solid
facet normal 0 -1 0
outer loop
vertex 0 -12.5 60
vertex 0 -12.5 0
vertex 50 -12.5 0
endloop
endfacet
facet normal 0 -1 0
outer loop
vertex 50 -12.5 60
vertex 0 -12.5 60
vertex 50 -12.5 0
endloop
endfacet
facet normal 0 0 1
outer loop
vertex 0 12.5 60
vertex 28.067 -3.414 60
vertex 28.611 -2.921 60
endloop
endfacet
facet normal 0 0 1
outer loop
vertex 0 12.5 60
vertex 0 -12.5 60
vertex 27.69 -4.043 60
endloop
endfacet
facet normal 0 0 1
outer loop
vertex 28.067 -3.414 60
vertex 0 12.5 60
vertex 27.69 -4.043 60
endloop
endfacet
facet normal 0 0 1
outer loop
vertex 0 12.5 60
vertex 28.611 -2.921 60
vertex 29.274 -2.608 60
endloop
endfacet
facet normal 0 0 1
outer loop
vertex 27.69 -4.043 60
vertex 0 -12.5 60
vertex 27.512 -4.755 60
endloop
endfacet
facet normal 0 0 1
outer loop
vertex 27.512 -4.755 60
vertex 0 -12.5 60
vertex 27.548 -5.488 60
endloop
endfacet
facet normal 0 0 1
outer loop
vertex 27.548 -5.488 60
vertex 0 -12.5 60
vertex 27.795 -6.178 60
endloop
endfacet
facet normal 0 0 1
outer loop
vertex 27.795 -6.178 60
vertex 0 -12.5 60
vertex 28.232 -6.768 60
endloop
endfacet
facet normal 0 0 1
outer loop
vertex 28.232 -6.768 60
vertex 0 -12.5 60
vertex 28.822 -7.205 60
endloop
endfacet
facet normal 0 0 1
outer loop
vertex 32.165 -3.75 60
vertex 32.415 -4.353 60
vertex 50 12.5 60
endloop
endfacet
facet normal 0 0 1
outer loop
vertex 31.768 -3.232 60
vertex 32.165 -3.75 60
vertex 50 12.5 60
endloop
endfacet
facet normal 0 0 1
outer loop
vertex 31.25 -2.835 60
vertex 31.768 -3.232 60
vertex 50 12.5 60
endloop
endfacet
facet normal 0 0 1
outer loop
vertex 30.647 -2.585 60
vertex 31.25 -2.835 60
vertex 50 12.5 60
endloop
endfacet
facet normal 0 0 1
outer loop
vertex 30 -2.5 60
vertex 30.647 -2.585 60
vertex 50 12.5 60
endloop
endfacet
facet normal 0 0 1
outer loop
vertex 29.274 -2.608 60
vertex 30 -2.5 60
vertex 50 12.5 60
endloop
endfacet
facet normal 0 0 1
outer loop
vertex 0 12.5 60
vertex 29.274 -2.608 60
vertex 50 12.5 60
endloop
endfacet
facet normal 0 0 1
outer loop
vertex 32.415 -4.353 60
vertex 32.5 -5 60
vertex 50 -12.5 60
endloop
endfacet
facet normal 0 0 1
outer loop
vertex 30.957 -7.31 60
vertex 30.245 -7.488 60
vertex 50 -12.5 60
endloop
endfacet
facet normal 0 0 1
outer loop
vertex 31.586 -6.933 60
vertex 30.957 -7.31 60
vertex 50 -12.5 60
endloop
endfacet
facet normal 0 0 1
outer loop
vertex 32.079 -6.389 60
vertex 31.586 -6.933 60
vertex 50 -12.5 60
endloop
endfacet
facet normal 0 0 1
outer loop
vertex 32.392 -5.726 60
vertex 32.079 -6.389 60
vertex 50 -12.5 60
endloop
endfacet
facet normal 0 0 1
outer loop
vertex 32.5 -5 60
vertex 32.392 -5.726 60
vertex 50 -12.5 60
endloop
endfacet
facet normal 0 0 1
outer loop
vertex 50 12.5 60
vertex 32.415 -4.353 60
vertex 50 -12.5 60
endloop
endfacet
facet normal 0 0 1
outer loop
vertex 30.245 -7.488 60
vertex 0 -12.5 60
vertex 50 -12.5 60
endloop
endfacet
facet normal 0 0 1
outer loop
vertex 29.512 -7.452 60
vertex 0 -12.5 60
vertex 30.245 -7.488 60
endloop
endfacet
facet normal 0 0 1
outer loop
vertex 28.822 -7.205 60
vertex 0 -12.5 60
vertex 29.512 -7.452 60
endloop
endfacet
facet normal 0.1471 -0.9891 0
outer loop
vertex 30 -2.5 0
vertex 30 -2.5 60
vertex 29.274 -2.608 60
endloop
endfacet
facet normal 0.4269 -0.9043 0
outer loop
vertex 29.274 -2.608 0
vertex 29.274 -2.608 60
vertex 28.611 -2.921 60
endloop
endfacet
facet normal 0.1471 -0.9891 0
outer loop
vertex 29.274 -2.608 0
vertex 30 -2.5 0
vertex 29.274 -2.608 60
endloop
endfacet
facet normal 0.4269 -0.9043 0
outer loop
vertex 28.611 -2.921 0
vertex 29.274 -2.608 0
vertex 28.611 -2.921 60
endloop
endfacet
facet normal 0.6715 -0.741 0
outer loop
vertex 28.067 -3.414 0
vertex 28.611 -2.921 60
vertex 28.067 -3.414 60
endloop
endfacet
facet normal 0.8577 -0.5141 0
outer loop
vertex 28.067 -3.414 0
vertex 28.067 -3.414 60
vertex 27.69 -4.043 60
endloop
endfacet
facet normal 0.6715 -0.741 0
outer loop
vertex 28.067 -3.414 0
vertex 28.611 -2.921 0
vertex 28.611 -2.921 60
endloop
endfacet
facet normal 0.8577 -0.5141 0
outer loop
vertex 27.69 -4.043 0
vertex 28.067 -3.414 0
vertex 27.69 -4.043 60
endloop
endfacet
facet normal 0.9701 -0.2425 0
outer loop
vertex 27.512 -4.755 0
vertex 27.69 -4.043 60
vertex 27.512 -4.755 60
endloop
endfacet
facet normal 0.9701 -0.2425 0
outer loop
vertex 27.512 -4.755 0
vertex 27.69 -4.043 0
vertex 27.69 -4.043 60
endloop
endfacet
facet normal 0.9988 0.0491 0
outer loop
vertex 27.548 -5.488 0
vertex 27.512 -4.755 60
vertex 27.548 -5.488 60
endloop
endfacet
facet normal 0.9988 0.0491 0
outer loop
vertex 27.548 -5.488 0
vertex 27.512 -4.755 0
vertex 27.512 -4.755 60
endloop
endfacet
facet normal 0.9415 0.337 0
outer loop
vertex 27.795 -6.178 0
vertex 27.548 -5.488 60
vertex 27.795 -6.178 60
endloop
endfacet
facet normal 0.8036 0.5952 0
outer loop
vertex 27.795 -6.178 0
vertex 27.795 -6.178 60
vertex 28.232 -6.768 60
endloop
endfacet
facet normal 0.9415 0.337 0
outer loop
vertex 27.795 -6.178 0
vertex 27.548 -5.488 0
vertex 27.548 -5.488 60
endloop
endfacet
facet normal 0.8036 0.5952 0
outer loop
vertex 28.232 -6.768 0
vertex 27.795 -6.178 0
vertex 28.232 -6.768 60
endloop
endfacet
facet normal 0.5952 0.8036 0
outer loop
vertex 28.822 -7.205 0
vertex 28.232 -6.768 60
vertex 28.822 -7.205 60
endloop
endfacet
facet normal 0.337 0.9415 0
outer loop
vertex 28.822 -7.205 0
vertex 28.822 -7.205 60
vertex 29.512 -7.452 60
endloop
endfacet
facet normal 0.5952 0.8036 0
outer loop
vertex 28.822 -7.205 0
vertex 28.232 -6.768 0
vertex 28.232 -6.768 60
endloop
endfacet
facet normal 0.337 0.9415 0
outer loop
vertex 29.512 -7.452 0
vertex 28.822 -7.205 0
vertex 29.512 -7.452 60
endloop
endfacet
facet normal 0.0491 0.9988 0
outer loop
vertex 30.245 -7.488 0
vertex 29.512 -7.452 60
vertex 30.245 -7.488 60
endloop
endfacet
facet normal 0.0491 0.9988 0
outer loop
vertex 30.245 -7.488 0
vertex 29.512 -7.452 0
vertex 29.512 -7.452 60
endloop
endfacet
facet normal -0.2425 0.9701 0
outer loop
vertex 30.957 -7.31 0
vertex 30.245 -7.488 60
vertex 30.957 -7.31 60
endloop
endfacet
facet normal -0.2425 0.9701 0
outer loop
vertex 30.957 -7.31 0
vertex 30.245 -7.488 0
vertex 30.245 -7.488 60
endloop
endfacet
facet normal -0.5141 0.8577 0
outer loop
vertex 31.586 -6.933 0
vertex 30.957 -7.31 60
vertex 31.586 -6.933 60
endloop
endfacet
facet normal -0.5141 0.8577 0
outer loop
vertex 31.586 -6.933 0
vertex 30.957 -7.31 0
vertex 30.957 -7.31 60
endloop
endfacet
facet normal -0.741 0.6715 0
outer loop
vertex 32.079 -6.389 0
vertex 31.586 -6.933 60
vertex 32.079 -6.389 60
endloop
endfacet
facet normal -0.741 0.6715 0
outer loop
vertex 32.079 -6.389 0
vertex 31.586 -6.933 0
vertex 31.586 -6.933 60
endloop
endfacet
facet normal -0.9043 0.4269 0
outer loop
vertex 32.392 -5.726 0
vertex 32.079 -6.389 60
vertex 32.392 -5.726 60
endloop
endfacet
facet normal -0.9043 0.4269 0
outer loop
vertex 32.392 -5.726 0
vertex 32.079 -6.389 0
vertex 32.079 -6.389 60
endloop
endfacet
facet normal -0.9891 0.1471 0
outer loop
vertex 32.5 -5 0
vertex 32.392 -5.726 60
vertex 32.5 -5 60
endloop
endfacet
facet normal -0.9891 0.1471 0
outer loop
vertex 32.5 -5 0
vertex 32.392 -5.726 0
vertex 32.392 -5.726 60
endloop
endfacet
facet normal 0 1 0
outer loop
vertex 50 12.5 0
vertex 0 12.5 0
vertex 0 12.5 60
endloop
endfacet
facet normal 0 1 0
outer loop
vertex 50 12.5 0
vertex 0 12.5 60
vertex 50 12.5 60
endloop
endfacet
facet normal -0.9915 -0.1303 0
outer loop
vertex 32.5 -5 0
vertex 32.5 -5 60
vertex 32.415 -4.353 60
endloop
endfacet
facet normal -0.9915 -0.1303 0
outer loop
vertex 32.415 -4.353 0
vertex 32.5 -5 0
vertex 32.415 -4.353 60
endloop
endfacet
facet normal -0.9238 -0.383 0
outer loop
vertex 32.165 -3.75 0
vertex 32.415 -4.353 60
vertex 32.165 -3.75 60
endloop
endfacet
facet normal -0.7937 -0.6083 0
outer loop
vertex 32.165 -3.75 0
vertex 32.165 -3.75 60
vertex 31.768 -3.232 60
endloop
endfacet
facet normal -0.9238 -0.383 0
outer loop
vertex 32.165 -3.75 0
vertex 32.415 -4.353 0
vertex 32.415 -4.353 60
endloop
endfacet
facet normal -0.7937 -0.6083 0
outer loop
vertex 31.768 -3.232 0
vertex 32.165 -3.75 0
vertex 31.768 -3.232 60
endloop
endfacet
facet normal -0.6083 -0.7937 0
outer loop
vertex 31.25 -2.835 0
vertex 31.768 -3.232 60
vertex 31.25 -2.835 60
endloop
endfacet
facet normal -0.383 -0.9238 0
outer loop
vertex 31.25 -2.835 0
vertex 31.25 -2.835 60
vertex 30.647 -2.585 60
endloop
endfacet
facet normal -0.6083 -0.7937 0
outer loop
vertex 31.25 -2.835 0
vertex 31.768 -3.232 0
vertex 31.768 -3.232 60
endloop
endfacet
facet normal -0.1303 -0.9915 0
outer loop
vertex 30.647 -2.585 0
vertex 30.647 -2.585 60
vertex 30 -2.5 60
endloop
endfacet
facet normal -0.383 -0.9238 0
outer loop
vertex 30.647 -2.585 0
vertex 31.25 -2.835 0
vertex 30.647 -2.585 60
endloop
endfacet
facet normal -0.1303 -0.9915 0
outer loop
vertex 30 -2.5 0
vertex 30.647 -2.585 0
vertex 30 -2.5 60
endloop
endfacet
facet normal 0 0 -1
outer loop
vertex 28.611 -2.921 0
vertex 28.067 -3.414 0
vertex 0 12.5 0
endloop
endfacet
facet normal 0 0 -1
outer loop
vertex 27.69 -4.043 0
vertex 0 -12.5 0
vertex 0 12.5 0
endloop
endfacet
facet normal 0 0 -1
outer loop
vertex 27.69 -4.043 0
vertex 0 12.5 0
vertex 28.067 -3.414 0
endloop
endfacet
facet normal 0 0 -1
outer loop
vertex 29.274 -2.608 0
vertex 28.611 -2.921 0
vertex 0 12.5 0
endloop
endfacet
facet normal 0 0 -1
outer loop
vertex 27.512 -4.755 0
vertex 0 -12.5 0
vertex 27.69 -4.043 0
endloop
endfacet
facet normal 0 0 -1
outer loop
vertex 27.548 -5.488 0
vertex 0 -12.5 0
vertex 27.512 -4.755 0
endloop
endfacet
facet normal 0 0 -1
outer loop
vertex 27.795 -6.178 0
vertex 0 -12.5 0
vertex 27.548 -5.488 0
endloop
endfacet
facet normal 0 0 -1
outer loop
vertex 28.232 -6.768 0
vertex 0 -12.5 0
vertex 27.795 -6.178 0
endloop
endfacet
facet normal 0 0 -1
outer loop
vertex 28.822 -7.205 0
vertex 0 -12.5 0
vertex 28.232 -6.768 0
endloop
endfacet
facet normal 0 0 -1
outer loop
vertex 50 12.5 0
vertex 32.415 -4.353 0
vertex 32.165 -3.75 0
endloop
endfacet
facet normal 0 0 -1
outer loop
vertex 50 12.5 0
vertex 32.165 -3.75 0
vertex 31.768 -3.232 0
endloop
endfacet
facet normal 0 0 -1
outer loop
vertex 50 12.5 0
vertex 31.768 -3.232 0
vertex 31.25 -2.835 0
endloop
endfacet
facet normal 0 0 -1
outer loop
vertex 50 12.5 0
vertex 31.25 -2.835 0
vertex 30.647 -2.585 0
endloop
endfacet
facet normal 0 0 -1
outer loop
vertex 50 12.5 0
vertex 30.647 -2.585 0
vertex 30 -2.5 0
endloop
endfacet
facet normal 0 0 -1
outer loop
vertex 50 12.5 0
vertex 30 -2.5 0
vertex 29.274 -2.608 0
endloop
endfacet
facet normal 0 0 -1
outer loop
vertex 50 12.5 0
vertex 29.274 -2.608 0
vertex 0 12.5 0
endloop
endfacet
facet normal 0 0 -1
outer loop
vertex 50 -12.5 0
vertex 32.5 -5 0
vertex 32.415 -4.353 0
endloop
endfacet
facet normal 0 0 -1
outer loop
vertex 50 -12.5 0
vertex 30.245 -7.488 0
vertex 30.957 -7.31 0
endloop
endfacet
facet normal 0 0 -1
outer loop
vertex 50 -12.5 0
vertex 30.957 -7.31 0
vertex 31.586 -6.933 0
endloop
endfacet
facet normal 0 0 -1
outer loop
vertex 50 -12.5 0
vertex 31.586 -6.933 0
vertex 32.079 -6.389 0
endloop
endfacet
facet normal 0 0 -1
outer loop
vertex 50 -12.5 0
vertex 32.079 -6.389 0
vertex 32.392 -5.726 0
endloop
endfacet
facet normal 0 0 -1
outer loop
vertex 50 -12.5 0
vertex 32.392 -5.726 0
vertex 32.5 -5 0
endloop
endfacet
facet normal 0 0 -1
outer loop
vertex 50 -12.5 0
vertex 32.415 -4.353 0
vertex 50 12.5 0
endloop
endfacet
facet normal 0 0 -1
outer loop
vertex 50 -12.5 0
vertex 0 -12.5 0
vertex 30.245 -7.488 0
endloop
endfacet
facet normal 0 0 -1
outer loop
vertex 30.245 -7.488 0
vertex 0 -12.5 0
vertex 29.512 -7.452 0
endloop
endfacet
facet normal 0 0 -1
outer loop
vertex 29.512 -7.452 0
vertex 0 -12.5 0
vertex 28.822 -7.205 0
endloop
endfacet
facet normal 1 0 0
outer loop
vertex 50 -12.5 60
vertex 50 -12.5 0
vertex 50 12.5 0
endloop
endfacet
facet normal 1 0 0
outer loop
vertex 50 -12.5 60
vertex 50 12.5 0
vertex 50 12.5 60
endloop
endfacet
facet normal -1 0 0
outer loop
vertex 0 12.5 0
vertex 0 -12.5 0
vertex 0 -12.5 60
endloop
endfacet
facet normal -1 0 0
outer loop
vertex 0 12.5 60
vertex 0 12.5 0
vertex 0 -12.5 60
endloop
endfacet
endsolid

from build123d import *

# Parameters (mm, degrees)
F0_W     = 50
F0_H     = 60
F1_DEPTH = 12.5
F3_DEPTH = 12.5
F5_DEPTH = 60


# Not quite as in the source:
# - a feature names something its author has since deleted; it is built from what else it names


with BuildPart() as f1:
    # F0 (on Front) → F1 (new body, symmetric)
    with BuildSketch(Plane.XZ):
        with Locations((25, 30)):
            Rectangle(F0_W, F0_H)
    extrude(amount=F1_DEPTH, both=True)

    # F2 (on Right) → F3 (cut, symmetric)
    with BuildSketch(Plane.YZ):
        Polygon((-12.1228452772, 60.4202598333), (0, 60.6142282486), (0, 70.6142282486), align=None)
    extrude(amount=F3_DEPTH, both=True, mode=Mode.SUBTRACT)

    # F4 (on Top) → F5 (cut, through all)
    with BuildSketch(Plane.XY):
        with BuildLine():
            ThreePointArc((30, -2.5), (28.232233047, -6.767766953), (32.5, -5))
            ThreePointArc((32.5, -5), (31.767766953, -3.232233047), (30, -2.5))
        make_face()
    extrude(amount=F5_DEPTH, mode=Mode.SUBTRACT)


solid = f1.part
